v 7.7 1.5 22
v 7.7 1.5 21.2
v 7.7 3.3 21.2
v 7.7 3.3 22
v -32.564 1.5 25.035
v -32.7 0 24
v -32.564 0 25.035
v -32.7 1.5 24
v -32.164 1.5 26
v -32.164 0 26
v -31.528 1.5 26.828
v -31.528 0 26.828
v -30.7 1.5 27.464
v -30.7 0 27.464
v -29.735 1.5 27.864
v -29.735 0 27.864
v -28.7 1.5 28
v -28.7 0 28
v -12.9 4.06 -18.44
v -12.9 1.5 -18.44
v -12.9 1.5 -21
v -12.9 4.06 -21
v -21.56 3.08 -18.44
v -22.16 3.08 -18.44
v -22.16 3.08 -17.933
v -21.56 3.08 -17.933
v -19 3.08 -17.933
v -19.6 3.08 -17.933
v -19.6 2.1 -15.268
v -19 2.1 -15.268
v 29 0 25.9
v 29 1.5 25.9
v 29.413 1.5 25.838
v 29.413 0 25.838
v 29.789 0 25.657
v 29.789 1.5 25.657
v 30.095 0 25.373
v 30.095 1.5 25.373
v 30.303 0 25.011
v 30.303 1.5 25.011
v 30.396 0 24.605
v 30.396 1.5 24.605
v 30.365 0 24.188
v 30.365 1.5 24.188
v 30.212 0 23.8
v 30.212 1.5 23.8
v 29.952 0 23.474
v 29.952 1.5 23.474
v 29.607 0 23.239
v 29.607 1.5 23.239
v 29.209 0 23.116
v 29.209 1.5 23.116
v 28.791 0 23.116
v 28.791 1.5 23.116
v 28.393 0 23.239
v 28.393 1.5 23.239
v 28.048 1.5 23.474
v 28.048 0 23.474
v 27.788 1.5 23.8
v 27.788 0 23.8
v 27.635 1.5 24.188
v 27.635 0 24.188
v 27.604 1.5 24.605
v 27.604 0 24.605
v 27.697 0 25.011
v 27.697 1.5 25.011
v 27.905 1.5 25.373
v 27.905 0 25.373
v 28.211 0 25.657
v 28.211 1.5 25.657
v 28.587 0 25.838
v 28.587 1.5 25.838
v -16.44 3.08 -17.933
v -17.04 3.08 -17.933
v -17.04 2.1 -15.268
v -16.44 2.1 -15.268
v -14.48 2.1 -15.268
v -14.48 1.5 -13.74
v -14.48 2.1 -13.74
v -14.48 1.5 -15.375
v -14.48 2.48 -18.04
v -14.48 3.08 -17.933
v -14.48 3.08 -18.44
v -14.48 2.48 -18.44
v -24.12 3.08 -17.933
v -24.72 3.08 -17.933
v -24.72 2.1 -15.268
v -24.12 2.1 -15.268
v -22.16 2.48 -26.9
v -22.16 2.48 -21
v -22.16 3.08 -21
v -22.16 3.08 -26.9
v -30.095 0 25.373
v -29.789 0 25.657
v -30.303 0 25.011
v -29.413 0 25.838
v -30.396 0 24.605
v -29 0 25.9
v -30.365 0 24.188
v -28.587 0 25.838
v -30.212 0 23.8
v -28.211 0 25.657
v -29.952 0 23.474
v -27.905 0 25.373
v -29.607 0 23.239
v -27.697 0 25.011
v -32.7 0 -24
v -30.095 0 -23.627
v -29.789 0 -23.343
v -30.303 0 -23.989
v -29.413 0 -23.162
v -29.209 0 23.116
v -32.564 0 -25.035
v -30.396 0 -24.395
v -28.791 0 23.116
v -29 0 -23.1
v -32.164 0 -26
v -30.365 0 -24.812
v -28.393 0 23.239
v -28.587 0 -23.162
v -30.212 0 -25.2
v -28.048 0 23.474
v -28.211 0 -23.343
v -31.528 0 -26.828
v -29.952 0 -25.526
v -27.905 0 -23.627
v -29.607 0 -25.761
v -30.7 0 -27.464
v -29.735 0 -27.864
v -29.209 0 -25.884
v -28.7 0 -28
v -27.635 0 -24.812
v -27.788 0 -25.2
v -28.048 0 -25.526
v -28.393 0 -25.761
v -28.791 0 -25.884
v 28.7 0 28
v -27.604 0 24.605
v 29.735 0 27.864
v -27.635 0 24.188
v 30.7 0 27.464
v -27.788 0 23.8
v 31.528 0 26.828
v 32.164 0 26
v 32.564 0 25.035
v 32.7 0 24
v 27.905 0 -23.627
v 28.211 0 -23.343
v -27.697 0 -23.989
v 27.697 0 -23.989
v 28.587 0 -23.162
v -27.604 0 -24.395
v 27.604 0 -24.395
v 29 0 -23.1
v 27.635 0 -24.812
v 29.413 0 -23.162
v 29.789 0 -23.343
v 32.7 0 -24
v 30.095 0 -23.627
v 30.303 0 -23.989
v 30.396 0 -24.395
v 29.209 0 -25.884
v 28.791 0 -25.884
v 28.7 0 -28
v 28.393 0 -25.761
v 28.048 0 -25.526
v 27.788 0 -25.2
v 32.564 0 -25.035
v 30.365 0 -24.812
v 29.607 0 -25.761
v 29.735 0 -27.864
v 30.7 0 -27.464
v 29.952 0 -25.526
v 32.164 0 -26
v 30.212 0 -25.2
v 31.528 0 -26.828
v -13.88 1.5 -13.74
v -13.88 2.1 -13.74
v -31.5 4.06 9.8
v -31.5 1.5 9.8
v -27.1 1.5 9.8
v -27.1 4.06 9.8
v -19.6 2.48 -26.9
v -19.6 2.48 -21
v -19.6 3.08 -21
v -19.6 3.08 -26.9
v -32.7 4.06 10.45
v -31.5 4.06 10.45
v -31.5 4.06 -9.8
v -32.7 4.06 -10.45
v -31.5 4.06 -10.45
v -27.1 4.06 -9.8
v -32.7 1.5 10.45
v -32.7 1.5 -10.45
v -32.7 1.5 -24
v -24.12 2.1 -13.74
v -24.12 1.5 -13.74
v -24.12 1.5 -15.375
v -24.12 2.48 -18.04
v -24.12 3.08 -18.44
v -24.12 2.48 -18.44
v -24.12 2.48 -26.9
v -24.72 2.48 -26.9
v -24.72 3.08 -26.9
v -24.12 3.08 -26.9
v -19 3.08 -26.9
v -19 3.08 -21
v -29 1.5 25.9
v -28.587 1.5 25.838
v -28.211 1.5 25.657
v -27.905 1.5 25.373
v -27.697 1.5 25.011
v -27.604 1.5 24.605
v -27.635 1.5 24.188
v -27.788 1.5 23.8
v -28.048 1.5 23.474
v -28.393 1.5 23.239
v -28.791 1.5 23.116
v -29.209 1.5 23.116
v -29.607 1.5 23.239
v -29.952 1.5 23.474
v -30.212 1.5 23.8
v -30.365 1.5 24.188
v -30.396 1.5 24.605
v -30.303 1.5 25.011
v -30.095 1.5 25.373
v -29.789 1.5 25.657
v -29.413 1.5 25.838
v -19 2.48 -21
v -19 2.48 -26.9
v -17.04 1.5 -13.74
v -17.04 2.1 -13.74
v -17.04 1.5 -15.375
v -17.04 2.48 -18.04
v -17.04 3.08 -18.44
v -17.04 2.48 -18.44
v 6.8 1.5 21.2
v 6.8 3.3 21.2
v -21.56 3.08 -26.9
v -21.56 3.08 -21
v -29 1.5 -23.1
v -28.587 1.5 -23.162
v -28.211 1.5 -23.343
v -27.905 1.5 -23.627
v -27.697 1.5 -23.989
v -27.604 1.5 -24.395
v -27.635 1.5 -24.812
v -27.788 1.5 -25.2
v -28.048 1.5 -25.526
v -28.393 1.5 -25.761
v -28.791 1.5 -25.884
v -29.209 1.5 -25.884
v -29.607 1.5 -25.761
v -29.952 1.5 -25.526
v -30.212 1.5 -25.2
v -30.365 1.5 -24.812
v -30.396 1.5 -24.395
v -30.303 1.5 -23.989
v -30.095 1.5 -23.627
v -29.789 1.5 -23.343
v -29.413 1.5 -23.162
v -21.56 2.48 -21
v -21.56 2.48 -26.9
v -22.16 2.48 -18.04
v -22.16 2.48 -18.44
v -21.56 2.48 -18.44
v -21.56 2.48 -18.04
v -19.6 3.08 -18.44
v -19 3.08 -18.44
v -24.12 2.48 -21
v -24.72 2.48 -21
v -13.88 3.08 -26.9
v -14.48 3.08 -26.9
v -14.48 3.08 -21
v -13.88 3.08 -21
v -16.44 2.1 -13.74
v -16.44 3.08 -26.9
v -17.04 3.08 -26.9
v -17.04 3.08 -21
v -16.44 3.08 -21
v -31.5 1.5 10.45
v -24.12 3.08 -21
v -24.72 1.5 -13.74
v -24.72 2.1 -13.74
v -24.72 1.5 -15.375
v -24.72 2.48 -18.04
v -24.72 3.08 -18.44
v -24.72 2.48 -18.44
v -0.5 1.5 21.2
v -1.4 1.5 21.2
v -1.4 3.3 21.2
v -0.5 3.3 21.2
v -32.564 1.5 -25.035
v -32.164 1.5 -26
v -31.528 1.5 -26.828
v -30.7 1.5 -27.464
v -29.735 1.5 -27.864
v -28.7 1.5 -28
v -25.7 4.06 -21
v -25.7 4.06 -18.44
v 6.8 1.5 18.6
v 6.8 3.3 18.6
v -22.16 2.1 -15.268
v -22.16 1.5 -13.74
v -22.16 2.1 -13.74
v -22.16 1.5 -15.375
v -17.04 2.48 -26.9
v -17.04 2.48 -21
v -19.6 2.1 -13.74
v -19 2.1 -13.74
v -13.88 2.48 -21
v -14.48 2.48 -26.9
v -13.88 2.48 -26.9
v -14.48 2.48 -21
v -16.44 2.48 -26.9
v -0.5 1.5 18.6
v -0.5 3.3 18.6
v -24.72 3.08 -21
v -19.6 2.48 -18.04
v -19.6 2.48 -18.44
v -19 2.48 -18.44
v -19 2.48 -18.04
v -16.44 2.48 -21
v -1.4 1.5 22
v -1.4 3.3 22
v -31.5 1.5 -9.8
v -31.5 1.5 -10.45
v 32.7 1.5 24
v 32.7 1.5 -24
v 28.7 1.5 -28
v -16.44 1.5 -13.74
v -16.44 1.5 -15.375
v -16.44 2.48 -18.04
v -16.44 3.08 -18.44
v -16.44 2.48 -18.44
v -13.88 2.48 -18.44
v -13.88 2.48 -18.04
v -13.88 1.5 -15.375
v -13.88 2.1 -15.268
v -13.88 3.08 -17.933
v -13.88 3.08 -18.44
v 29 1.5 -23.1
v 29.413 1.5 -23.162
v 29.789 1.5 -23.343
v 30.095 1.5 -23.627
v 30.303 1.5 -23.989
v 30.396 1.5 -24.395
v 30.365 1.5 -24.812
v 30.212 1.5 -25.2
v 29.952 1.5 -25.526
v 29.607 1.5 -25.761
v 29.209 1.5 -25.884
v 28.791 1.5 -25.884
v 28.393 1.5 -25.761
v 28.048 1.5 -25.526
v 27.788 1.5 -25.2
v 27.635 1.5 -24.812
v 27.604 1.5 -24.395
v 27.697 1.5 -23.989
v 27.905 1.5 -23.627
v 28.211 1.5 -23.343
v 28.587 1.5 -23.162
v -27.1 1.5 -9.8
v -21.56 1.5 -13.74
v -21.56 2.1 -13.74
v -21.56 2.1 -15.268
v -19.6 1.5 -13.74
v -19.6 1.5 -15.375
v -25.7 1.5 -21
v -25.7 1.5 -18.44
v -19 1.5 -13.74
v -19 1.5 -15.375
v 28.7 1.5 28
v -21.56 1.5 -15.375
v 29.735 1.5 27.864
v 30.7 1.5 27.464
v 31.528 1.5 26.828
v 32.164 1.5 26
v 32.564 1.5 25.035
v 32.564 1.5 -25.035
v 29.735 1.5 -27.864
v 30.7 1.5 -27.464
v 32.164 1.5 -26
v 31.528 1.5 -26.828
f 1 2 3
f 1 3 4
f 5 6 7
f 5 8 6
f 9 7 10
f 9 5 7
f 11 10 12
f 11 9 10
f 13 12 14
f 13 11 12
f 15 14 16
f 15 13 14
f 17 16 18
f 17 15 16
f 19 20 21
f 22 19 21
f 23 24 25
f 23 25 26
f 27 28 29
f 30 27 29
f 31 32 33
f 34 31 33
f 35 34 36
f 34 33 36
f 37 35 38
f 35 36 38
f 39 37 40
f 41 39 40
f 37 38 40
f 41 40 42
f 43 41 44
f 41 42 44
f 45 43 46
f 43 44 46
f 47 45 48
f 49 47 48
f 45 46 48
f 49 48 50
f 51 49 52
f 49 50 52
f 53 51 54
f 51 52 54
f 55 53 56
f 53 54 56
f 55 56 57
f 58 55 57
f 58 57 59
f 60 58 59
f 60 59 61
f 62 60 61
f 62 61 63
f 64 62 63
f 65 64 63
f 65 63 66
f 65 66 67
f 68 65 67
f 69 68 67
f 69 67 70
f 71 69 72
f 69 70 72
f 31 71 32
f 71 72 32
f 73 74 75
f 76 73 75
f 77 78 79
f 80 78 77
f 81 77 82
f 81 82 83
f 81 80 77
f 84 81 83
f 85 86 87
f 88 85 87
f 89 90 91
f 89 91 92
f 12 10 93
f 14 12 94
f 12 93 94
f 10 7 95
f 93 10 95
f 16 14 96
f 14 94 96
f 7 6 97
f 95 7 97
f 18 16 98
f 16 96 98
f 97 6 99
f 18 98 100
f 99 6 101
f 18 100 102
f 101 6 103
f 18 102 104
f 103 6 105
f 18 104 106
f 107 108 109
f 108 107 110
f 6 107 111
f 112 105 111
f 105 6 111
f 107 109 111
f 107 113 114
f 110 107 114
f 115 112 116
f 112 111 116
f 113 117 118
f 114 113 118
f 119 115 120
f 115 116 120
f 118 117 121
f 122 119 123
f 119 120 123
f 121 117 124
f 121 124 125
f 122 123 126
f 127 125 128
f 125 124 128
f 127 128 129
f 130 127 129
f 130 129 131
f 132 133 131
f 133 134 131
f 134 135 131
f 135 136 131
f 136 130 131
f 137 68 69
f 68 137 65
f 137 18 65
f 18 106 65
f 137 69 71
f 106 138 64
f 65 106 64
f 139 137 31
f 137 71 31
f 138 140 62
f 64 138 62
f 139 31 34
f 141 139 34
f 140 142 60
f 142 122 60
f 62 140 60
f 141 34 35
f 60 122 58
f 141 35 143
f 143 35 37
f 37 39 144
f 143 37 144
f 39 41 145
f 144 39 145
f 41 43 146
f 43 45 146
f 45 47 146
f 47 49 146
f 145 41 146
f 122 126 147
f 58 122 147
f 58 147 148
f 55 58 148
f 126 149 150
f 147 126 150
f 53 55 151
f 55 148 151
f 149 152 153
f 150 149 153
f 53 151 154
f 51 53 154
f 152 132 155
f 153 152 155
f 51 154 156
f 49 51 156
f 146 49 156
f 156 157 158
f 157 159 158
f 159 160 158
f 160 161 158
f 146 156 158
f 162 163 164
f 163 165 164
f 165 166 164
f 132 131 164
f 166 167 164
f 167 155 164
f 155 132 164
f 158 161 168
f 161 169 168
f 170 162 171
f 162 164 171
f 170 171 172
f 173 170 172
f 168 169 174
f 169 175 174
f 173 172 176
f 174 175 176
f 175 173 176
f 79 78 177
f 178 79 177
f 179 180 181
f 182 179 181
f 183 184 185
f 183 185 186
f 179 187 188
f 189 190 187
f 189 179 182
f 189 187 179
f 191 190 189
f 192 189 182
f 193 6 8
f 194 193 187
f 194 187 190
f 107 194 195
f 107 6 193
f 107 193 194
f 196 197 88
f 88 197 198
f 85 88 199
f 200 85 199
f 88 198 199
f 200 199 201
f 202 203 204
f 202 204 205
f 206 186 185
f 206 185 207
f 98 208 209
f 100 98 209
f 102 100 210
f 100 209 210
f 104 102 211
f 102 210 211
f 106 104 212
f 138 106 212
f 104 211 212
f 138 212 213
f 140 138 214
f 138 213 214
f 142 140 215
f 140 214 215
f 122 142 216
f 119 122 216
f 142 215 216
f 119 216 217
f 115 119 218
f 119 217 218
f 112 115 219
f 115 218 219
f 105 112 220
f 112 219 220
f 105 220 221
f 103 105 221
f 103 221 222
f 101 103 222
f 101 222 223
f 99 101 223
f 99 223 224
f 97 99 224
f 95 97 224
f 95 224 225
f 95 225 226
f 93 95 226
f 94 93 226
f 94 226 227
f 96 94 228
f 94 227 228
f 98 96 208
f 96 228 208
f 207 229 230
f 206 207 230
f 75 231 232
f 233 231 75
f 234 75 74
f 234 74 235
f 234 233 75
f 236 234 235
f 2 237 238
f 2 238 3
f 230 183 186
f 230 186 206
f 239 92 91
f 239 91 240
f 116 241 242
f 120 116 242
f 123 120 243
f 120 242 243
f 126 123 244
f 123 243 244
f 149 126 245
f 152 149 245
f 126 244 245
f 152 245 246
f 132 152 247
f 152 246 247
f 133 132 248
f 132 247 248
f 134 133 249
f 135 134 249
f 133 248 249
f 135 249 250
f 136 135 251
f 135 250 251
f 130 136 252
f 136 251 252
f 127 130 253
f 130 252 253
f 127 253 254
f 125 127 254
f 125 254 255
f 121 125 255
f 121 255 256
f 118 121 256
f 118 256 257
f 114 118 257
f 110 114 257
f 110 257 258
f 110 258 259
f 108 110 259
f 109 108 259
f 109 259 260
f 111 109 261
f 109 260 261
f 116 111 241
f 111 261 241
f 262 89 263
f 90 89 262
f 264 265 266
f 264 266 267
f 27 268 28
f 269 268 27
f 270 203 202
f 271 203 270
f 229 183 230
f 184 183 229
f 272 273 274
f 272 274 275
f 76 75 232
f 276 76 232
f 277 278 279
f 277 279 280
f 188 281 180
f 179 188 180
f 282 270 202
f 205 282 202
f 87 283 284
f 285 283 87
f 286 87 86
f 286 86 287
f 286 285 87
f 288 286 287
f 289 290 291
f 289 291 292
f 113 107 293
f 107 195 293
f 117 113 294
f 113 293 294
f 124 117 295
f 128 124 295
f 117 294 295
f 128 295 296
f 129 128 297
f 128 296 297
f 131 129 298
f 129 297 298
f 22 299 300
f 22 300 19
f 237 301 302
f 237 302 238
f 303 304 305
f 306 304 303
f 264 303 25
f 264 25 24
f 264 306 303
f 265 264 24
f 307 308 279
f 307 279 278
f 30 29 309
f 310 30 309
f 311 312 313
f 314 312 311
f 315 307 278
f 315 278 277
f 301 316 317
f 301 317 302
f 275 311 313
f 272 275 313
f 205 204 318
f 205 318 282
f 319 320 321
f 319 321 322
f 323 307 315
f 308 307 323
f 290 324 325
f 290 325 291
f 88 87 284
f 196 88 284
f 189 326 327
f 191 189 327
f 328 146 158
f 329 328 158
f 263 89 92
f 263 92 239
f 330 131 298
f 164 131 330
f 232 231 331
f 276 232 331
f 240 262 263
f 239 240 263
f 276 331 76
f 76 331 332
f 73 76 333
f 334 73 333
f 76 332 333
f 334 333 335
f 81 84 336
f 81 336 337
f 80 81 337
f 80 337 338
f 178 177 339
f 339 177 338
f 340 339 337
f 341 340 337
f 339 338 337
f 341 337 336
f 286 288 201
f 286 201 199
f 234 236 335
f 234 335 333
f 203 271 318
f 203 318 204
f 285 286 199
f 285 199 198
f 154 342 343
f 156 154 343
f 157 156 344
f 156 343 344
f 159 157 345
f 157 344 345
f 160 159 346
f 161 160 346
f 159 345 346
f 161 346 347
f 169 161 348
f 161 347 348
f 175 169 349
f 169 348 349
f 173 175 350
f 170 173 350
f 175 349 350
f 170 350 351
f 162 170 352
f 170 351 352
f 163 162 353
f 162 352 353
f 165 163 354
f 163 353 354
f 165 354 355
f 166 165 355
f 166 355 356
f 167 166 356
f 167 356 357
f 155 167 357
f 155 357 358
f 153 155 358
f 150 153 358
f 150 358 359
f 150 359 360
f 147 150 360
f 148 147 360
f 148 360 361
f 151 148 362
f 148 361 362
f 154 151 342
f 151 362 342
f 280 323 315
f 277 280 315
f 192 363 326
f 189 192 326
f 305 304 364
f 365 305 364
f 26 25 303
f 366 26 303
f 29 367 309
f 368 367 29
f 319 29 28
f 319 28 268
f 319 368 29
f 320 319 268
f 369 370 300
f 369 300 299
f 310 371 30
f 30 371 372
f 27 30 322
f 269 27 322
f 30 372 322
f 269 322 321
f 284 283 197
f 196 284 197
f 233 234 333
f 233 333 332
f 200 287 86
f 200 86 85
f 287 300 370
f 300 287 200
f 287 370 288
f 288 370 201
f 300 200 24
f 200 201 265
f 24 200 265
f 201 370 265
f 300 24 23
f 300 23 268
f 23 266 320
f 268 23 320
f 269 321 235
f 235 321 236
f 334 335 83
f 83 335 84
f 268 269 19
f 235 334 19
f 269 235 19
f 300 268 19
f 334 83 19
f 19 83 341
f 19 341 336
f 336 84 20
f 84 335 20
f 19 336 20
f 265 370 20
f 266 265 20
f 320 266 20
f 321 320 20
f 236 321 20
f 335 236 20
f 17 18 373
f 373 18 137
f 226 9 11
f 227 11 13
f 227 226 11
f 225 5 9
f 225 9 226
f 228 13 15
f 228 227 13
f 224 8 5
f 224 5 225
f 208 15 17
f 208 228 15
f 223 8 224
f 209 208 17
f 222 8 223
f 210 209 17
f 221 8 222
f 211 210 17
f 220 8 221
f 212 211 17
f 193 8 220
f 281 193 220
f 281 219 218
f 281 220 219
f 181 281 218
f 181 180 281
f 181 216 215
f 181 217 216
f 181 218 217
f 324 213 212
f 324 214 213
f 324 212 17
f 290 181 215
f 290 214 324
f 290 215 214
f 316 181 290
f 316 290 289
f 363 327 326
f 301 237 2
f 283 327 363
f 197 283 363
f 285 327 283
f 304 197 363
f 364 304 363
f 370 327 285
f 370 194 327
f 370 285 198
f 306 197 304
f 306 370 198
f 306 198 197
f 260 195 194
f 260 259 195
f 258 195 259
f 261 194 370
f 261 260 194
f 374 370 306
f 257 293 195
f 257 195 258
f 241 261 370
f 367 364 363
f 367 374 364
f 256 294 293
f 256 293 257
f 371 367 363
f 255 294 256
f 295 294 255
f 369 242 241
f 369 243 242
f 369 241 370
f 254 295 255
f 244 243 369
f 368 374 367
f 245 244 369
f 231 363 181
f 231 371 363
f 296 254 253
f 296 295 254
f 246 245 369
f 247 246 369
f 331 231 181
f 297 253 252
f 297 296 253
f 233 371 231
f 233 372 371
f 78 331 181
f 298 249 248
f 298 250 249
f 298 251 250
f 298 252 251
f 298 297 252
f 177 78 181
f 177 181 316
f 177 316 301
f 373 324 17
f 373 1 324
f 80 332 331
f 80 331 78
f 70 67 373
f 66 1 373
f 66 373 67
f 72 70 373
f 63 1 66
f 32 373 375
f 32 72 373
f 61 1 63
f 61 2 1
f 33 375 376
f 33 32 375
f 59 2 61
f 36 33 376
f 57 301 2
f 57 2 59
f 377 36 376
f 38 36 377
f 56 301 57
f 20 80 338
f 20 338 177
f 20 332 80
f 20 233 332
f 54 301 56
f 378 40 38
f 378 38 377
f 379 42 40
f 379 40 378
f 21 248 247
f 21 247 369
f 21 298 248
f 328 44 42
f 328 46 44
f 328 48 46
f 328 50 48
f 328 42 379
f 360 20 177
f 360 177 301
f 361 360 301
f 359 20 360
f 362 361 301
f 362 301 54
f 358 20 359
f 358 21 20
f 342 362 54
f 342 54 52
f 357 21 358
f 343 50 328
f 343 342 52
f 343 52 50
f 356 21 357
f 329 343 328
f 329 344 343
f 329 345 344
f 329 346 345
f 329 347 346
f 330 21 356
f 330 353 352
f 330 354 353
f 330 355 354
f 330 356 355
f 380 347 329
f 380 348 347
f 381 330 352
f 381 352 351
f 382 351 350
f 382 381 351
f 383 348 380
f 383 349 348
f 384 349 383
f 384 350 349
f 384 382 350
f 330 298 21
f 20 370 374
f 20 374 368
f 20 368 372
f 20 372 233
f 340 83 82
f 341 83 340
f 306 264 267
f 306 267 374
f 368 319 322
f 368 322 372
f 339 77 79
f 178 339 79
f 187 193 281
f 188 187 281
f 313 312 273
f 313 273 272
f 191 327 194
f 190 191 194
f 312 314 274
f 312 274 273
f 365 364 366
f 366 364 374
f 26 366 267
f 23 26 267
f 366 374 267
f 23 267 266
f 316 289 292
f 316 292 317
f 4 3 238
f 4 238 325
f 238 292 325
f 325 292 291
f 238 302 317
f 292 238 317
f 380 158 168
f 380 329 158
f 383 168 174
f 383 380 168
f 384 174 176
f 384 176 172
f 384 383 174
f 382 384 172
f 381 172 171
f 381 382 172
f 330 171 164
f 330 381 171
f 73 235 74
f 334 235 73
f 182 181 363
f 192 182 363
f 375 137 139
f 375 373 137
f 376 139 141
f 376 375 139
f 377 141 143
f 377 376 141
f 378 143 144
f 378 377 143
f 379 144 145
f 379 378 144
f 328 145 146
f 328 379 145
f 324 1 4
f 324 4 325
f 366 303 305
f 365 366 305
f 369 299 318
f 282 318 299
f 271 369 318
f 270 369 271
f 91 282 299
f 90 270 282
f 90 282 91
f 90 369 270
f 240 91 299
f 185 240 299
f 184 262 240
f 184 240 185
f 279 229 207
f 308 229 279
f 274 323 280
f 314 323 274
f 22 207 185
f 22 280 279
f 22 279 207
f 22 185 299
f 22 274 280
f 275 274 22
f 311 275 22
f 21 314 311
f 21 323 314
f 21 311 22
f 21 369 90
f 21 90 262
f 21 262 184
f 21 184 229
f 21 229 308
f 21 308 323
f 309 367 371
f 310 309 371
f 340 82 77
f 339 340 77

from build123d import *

# Parameters (mm, degrees)
ESQUISSE1_W             = 65.4
ESQUISSE1_H             = 56
BOSS_EXTRU_1_DEPTH      = 1.5
CONG_1_R                = 4
ESQUISSE2_R             = 1.4
ENL_V_MAT_EXTRU_1_DEPTH = 1.5
ESQUISSE3_W             = 12.8
ESQUISSE3_H             = 2.56
BOSS_EXTRU_2_DEPTH      = 2.56
ESQUISSE4_W             = 0.6
ESQUISSE4_H             = 13.16
BOSS_EXTRU_3_DEPTH      = 1.58
ENL_V_MAT_EXTRU_2_REACH = 66.012
ESQUISSE5_W             = 5.9
ESQUISSE5_H             = 0.98
BOSS_EXTRU_4_DEPTH      = 2.56
BOSS_EXTRU_5_DEPTH      = 1.8


with BuildPart() as part:
    # Esquisse1 → Boss.-Extru.1 (new body)
    with BuildSketch(Plane(origin=(0, 0, 0), x_dir=(1, 0, 0), z_dir=(0, 1, 0))):
        Rectangle(ESQUISSE1_W, ESQUISSE1_H)
    extrude(amount=BOSS_EXTRU_1_DEPTH)

    # Congé1
    cong_1_edges = [part.edges().sort_by_distance(p)[0] for p in [
        (32.7, 0.75, 28),
        (-32.7, 0.75, 28),
        (-32.7, 0.75, -28),
        (32.7, 0.75, -28),
    ]]
    fillet(cong_1_edges, radius=CONG_1_R)

    # Esquisse2 → Enlèv. mat.-Extru.1 (cut)
    with BuildSketch(Plane(origin=(0, 1.5, 0), x_dir=(1, 0, 0), z_dir=(0, 1, 0))):
        with Locations(Location((-29, 24.5, 0), (0, 0, 270))):
            Circle(ESQUISSE2_R)
        with Locations(Location((-29, -24.5, 0), (0, 0, 270))):
            Circle(ESQUISSE2_R)
        with Locations(Location((29, -24.5, 0), (0, 0, 270))):
            Circle(ESQUISSE2_R)
        with Locations(Location((29, 24.5, 0), (0, 0, 270))):
            Circle(ESQUISSE2_R)
    extrude(amount=-ENL_V_MAT_EXTRU_1_DEPTH, mode=Mode.SUBTRACT)

    # Esquisse3 → Boss.-Extru.2 (add)
    with BuildSketch(Plane(origin=(0, 1.5, 0), x_dir=(1, 0, 0), z_dir=(0, 1, 0))):
        with Locations((-19.3, 19.72)):
            Rectangle(ESQUISSE3_W, ESQUISSE3_H)
    extrude(amount=BOSS_EXTRU_2_DEPTH)

    # Esquisse4 → Boss.-Extru.3 (add)
    with BuildSketch(Plane(origin=(0, 1.5, 0), x_dir=(1, 0, 0), z_dir=(0, 1, 0))):
        with Locations((-24.42, 20.32)):
            Rectangle(ESQUISSE4_W, ESQUISSE4_H)
        with Locations((-21.86, 20.32)):
            Rectangle(ESQUISSE4_W, ESQUISSE4_H)
        with Locations((-19.3, 20.32)):
            Rectangle(ESQUISSE4_W, ESQUISSE4_H)
        with Locations((-16.74, 20.32)):
            Rectangle(ESQUISSE4_W, ESQUISSE4_H)
        with Locations((-14.18, 20.32)):
            Rectangle(ESQUISSE4_W, ESQUISSE4_H)
    extrude(amount=BOSS_EXTRU_3_DEPTH)

    # Enlèv. mat.-Extru.2: up to this face of the body (flat: up to its plane)
    enl_v_mat_extru_2_end = Plane(part.part.faces().sort_by_distance((-13.88, 2.29, -16.09))[0])
    # Esquisse5 → Enlèv. mat.-Extru.2 (cut, up to the picked face)
    with BuildSketch(Plane.ZY.offset(24.72), mode=Mode.PRIVATE) as enl_v_mat_extru_2_sk1:
        with Locations((-23.95, 1.99)):
            Rectangle(ESQUISSE5_W, ESQUISSE5_H)
    enl_v_mat_extru_2_tool1 = split(extrude(enl_v_mat_extru_2_sk1.sketch, amount=-ENL_V_MAT_EXTRU_2_REACH, mode=Mode.PRIVATE), bisect_by=enl_v_mat_extru_2_end, keep=Keep.BOTH, mode=Mode.PRIVATE)
    # Esquisse5 → Enlèv. mat.-Extru.2 (cut, up to the picked face)
    with BuildSketch(Plane.ZY.offset(24.72), mode=Mode.PRIVATE) as enl_v_mat_extru_2_sk2:
        with BuildLine():
            Line((-17.9329542, 3.08), (-15.267871538, 2.100055504))
            Line((-15.267871538, 2.100055504), (-13.74, 2.100055504))
            ThreePointArc((-13.74, 2.100055504), (-13.106146425, 2.552094428), (-13.327063257, 3.298623259))
            Line((-13.327063257, 3.298623259), (-17.9329542, 3.47707173))
            Line((-17.9329542, 3.47707173), (-17.9329542, 3.08))
        make_face()
    enl_v_mat_extru_2_tool2 = split(extrude(enl_v_mat_extru_2_sk2.sketch, amount=-ENL_V_MAT_EXTRU_2_REACH, mode=Mode.PRIVATE), bisect_by=enl_v_mat_extru_2_end, keep=Keep.BOTH, mode=Mode.PRIVATE)
    # Esquisse5 → Enlèv. mat.-Extru.2 (cut, up to the picked face)
    with BuildSketch(Plane.ZY.offset(24.72), mode=Mode.PRIVATE) as enl_v_mat_extru_2_sk3:
        Polygon((-18.44, 2.48), (-18.039767565, 2.48), (-15.374533954, 1.5), (-18.44, 1.5), align=None)
    enl_v_mat_extru_2_tool3 = split(extrude(enl_v_mat_extru_2_sk3.sketch, amount=-ENL_V_MAT_EXTRU_2_REACH, mode=Mode.PRIVATE), bisect_by=enl_v_mat_extru_2_end, keep=Keep.BOTH, mode=Mode.PRIVATE)
    add(enl_v_mat_extru_2_tool1.solids().sort_by(Axis((-24.72, 1.99, -23.95), (1, 0, 0)))[0], mode=Mode.SUBTRACT)
    add(enl_v_mat_extru_2_tool2.solids().sort_by(Axis((-24.72, 2.834984, -15.224036), (1, 0, 0)))[0], mode=Mode.SUBTRACT)
    add(enl_v_mat_extru_2_tool3.solids().sort_by(Axis((-24.72, 1.864391, -17.402771), (1, 0, 0)))[0], mode=Mode.SUBTRACT)

    # Esquisse6 → Boss.-Extru.4 (add)
    with BuildSketch(Plane(origin=(0, 1.5, 0), x_dir=(1, 0, 0), z_dir=(0, 1, 0))):
        Polygon((-31.5, 10.45), (-32.7, 10.45), (-32.7, -10.45), (-31.5, -10.45), (-31.5, -9.8), (-27.1, -9.8), (-27.1, 9.8), (-31.5, 9.8), align=None)
    extrude(amount=BOSS_EXTRU_4_DEPTH)

    # Esquisse7 → Boss.-Extru.5 (add)
    with BuildSketch(Plane(origin=(0, 1.5, 0), x_dir=(1, 0, 0), z_dir=(0, 1, 0))):
        Polygon((-0.5, -18.6), (6.8, -18.6), (6.8, -21.2), (7.7, -21.2), (7.7, -22), (-1.4, -22), (-1.4, -21.2), (-0.5, -21.2), align=None)
    extrude(amount=BOSS_EXTRU_5_DEPTH)


solid = part.part
